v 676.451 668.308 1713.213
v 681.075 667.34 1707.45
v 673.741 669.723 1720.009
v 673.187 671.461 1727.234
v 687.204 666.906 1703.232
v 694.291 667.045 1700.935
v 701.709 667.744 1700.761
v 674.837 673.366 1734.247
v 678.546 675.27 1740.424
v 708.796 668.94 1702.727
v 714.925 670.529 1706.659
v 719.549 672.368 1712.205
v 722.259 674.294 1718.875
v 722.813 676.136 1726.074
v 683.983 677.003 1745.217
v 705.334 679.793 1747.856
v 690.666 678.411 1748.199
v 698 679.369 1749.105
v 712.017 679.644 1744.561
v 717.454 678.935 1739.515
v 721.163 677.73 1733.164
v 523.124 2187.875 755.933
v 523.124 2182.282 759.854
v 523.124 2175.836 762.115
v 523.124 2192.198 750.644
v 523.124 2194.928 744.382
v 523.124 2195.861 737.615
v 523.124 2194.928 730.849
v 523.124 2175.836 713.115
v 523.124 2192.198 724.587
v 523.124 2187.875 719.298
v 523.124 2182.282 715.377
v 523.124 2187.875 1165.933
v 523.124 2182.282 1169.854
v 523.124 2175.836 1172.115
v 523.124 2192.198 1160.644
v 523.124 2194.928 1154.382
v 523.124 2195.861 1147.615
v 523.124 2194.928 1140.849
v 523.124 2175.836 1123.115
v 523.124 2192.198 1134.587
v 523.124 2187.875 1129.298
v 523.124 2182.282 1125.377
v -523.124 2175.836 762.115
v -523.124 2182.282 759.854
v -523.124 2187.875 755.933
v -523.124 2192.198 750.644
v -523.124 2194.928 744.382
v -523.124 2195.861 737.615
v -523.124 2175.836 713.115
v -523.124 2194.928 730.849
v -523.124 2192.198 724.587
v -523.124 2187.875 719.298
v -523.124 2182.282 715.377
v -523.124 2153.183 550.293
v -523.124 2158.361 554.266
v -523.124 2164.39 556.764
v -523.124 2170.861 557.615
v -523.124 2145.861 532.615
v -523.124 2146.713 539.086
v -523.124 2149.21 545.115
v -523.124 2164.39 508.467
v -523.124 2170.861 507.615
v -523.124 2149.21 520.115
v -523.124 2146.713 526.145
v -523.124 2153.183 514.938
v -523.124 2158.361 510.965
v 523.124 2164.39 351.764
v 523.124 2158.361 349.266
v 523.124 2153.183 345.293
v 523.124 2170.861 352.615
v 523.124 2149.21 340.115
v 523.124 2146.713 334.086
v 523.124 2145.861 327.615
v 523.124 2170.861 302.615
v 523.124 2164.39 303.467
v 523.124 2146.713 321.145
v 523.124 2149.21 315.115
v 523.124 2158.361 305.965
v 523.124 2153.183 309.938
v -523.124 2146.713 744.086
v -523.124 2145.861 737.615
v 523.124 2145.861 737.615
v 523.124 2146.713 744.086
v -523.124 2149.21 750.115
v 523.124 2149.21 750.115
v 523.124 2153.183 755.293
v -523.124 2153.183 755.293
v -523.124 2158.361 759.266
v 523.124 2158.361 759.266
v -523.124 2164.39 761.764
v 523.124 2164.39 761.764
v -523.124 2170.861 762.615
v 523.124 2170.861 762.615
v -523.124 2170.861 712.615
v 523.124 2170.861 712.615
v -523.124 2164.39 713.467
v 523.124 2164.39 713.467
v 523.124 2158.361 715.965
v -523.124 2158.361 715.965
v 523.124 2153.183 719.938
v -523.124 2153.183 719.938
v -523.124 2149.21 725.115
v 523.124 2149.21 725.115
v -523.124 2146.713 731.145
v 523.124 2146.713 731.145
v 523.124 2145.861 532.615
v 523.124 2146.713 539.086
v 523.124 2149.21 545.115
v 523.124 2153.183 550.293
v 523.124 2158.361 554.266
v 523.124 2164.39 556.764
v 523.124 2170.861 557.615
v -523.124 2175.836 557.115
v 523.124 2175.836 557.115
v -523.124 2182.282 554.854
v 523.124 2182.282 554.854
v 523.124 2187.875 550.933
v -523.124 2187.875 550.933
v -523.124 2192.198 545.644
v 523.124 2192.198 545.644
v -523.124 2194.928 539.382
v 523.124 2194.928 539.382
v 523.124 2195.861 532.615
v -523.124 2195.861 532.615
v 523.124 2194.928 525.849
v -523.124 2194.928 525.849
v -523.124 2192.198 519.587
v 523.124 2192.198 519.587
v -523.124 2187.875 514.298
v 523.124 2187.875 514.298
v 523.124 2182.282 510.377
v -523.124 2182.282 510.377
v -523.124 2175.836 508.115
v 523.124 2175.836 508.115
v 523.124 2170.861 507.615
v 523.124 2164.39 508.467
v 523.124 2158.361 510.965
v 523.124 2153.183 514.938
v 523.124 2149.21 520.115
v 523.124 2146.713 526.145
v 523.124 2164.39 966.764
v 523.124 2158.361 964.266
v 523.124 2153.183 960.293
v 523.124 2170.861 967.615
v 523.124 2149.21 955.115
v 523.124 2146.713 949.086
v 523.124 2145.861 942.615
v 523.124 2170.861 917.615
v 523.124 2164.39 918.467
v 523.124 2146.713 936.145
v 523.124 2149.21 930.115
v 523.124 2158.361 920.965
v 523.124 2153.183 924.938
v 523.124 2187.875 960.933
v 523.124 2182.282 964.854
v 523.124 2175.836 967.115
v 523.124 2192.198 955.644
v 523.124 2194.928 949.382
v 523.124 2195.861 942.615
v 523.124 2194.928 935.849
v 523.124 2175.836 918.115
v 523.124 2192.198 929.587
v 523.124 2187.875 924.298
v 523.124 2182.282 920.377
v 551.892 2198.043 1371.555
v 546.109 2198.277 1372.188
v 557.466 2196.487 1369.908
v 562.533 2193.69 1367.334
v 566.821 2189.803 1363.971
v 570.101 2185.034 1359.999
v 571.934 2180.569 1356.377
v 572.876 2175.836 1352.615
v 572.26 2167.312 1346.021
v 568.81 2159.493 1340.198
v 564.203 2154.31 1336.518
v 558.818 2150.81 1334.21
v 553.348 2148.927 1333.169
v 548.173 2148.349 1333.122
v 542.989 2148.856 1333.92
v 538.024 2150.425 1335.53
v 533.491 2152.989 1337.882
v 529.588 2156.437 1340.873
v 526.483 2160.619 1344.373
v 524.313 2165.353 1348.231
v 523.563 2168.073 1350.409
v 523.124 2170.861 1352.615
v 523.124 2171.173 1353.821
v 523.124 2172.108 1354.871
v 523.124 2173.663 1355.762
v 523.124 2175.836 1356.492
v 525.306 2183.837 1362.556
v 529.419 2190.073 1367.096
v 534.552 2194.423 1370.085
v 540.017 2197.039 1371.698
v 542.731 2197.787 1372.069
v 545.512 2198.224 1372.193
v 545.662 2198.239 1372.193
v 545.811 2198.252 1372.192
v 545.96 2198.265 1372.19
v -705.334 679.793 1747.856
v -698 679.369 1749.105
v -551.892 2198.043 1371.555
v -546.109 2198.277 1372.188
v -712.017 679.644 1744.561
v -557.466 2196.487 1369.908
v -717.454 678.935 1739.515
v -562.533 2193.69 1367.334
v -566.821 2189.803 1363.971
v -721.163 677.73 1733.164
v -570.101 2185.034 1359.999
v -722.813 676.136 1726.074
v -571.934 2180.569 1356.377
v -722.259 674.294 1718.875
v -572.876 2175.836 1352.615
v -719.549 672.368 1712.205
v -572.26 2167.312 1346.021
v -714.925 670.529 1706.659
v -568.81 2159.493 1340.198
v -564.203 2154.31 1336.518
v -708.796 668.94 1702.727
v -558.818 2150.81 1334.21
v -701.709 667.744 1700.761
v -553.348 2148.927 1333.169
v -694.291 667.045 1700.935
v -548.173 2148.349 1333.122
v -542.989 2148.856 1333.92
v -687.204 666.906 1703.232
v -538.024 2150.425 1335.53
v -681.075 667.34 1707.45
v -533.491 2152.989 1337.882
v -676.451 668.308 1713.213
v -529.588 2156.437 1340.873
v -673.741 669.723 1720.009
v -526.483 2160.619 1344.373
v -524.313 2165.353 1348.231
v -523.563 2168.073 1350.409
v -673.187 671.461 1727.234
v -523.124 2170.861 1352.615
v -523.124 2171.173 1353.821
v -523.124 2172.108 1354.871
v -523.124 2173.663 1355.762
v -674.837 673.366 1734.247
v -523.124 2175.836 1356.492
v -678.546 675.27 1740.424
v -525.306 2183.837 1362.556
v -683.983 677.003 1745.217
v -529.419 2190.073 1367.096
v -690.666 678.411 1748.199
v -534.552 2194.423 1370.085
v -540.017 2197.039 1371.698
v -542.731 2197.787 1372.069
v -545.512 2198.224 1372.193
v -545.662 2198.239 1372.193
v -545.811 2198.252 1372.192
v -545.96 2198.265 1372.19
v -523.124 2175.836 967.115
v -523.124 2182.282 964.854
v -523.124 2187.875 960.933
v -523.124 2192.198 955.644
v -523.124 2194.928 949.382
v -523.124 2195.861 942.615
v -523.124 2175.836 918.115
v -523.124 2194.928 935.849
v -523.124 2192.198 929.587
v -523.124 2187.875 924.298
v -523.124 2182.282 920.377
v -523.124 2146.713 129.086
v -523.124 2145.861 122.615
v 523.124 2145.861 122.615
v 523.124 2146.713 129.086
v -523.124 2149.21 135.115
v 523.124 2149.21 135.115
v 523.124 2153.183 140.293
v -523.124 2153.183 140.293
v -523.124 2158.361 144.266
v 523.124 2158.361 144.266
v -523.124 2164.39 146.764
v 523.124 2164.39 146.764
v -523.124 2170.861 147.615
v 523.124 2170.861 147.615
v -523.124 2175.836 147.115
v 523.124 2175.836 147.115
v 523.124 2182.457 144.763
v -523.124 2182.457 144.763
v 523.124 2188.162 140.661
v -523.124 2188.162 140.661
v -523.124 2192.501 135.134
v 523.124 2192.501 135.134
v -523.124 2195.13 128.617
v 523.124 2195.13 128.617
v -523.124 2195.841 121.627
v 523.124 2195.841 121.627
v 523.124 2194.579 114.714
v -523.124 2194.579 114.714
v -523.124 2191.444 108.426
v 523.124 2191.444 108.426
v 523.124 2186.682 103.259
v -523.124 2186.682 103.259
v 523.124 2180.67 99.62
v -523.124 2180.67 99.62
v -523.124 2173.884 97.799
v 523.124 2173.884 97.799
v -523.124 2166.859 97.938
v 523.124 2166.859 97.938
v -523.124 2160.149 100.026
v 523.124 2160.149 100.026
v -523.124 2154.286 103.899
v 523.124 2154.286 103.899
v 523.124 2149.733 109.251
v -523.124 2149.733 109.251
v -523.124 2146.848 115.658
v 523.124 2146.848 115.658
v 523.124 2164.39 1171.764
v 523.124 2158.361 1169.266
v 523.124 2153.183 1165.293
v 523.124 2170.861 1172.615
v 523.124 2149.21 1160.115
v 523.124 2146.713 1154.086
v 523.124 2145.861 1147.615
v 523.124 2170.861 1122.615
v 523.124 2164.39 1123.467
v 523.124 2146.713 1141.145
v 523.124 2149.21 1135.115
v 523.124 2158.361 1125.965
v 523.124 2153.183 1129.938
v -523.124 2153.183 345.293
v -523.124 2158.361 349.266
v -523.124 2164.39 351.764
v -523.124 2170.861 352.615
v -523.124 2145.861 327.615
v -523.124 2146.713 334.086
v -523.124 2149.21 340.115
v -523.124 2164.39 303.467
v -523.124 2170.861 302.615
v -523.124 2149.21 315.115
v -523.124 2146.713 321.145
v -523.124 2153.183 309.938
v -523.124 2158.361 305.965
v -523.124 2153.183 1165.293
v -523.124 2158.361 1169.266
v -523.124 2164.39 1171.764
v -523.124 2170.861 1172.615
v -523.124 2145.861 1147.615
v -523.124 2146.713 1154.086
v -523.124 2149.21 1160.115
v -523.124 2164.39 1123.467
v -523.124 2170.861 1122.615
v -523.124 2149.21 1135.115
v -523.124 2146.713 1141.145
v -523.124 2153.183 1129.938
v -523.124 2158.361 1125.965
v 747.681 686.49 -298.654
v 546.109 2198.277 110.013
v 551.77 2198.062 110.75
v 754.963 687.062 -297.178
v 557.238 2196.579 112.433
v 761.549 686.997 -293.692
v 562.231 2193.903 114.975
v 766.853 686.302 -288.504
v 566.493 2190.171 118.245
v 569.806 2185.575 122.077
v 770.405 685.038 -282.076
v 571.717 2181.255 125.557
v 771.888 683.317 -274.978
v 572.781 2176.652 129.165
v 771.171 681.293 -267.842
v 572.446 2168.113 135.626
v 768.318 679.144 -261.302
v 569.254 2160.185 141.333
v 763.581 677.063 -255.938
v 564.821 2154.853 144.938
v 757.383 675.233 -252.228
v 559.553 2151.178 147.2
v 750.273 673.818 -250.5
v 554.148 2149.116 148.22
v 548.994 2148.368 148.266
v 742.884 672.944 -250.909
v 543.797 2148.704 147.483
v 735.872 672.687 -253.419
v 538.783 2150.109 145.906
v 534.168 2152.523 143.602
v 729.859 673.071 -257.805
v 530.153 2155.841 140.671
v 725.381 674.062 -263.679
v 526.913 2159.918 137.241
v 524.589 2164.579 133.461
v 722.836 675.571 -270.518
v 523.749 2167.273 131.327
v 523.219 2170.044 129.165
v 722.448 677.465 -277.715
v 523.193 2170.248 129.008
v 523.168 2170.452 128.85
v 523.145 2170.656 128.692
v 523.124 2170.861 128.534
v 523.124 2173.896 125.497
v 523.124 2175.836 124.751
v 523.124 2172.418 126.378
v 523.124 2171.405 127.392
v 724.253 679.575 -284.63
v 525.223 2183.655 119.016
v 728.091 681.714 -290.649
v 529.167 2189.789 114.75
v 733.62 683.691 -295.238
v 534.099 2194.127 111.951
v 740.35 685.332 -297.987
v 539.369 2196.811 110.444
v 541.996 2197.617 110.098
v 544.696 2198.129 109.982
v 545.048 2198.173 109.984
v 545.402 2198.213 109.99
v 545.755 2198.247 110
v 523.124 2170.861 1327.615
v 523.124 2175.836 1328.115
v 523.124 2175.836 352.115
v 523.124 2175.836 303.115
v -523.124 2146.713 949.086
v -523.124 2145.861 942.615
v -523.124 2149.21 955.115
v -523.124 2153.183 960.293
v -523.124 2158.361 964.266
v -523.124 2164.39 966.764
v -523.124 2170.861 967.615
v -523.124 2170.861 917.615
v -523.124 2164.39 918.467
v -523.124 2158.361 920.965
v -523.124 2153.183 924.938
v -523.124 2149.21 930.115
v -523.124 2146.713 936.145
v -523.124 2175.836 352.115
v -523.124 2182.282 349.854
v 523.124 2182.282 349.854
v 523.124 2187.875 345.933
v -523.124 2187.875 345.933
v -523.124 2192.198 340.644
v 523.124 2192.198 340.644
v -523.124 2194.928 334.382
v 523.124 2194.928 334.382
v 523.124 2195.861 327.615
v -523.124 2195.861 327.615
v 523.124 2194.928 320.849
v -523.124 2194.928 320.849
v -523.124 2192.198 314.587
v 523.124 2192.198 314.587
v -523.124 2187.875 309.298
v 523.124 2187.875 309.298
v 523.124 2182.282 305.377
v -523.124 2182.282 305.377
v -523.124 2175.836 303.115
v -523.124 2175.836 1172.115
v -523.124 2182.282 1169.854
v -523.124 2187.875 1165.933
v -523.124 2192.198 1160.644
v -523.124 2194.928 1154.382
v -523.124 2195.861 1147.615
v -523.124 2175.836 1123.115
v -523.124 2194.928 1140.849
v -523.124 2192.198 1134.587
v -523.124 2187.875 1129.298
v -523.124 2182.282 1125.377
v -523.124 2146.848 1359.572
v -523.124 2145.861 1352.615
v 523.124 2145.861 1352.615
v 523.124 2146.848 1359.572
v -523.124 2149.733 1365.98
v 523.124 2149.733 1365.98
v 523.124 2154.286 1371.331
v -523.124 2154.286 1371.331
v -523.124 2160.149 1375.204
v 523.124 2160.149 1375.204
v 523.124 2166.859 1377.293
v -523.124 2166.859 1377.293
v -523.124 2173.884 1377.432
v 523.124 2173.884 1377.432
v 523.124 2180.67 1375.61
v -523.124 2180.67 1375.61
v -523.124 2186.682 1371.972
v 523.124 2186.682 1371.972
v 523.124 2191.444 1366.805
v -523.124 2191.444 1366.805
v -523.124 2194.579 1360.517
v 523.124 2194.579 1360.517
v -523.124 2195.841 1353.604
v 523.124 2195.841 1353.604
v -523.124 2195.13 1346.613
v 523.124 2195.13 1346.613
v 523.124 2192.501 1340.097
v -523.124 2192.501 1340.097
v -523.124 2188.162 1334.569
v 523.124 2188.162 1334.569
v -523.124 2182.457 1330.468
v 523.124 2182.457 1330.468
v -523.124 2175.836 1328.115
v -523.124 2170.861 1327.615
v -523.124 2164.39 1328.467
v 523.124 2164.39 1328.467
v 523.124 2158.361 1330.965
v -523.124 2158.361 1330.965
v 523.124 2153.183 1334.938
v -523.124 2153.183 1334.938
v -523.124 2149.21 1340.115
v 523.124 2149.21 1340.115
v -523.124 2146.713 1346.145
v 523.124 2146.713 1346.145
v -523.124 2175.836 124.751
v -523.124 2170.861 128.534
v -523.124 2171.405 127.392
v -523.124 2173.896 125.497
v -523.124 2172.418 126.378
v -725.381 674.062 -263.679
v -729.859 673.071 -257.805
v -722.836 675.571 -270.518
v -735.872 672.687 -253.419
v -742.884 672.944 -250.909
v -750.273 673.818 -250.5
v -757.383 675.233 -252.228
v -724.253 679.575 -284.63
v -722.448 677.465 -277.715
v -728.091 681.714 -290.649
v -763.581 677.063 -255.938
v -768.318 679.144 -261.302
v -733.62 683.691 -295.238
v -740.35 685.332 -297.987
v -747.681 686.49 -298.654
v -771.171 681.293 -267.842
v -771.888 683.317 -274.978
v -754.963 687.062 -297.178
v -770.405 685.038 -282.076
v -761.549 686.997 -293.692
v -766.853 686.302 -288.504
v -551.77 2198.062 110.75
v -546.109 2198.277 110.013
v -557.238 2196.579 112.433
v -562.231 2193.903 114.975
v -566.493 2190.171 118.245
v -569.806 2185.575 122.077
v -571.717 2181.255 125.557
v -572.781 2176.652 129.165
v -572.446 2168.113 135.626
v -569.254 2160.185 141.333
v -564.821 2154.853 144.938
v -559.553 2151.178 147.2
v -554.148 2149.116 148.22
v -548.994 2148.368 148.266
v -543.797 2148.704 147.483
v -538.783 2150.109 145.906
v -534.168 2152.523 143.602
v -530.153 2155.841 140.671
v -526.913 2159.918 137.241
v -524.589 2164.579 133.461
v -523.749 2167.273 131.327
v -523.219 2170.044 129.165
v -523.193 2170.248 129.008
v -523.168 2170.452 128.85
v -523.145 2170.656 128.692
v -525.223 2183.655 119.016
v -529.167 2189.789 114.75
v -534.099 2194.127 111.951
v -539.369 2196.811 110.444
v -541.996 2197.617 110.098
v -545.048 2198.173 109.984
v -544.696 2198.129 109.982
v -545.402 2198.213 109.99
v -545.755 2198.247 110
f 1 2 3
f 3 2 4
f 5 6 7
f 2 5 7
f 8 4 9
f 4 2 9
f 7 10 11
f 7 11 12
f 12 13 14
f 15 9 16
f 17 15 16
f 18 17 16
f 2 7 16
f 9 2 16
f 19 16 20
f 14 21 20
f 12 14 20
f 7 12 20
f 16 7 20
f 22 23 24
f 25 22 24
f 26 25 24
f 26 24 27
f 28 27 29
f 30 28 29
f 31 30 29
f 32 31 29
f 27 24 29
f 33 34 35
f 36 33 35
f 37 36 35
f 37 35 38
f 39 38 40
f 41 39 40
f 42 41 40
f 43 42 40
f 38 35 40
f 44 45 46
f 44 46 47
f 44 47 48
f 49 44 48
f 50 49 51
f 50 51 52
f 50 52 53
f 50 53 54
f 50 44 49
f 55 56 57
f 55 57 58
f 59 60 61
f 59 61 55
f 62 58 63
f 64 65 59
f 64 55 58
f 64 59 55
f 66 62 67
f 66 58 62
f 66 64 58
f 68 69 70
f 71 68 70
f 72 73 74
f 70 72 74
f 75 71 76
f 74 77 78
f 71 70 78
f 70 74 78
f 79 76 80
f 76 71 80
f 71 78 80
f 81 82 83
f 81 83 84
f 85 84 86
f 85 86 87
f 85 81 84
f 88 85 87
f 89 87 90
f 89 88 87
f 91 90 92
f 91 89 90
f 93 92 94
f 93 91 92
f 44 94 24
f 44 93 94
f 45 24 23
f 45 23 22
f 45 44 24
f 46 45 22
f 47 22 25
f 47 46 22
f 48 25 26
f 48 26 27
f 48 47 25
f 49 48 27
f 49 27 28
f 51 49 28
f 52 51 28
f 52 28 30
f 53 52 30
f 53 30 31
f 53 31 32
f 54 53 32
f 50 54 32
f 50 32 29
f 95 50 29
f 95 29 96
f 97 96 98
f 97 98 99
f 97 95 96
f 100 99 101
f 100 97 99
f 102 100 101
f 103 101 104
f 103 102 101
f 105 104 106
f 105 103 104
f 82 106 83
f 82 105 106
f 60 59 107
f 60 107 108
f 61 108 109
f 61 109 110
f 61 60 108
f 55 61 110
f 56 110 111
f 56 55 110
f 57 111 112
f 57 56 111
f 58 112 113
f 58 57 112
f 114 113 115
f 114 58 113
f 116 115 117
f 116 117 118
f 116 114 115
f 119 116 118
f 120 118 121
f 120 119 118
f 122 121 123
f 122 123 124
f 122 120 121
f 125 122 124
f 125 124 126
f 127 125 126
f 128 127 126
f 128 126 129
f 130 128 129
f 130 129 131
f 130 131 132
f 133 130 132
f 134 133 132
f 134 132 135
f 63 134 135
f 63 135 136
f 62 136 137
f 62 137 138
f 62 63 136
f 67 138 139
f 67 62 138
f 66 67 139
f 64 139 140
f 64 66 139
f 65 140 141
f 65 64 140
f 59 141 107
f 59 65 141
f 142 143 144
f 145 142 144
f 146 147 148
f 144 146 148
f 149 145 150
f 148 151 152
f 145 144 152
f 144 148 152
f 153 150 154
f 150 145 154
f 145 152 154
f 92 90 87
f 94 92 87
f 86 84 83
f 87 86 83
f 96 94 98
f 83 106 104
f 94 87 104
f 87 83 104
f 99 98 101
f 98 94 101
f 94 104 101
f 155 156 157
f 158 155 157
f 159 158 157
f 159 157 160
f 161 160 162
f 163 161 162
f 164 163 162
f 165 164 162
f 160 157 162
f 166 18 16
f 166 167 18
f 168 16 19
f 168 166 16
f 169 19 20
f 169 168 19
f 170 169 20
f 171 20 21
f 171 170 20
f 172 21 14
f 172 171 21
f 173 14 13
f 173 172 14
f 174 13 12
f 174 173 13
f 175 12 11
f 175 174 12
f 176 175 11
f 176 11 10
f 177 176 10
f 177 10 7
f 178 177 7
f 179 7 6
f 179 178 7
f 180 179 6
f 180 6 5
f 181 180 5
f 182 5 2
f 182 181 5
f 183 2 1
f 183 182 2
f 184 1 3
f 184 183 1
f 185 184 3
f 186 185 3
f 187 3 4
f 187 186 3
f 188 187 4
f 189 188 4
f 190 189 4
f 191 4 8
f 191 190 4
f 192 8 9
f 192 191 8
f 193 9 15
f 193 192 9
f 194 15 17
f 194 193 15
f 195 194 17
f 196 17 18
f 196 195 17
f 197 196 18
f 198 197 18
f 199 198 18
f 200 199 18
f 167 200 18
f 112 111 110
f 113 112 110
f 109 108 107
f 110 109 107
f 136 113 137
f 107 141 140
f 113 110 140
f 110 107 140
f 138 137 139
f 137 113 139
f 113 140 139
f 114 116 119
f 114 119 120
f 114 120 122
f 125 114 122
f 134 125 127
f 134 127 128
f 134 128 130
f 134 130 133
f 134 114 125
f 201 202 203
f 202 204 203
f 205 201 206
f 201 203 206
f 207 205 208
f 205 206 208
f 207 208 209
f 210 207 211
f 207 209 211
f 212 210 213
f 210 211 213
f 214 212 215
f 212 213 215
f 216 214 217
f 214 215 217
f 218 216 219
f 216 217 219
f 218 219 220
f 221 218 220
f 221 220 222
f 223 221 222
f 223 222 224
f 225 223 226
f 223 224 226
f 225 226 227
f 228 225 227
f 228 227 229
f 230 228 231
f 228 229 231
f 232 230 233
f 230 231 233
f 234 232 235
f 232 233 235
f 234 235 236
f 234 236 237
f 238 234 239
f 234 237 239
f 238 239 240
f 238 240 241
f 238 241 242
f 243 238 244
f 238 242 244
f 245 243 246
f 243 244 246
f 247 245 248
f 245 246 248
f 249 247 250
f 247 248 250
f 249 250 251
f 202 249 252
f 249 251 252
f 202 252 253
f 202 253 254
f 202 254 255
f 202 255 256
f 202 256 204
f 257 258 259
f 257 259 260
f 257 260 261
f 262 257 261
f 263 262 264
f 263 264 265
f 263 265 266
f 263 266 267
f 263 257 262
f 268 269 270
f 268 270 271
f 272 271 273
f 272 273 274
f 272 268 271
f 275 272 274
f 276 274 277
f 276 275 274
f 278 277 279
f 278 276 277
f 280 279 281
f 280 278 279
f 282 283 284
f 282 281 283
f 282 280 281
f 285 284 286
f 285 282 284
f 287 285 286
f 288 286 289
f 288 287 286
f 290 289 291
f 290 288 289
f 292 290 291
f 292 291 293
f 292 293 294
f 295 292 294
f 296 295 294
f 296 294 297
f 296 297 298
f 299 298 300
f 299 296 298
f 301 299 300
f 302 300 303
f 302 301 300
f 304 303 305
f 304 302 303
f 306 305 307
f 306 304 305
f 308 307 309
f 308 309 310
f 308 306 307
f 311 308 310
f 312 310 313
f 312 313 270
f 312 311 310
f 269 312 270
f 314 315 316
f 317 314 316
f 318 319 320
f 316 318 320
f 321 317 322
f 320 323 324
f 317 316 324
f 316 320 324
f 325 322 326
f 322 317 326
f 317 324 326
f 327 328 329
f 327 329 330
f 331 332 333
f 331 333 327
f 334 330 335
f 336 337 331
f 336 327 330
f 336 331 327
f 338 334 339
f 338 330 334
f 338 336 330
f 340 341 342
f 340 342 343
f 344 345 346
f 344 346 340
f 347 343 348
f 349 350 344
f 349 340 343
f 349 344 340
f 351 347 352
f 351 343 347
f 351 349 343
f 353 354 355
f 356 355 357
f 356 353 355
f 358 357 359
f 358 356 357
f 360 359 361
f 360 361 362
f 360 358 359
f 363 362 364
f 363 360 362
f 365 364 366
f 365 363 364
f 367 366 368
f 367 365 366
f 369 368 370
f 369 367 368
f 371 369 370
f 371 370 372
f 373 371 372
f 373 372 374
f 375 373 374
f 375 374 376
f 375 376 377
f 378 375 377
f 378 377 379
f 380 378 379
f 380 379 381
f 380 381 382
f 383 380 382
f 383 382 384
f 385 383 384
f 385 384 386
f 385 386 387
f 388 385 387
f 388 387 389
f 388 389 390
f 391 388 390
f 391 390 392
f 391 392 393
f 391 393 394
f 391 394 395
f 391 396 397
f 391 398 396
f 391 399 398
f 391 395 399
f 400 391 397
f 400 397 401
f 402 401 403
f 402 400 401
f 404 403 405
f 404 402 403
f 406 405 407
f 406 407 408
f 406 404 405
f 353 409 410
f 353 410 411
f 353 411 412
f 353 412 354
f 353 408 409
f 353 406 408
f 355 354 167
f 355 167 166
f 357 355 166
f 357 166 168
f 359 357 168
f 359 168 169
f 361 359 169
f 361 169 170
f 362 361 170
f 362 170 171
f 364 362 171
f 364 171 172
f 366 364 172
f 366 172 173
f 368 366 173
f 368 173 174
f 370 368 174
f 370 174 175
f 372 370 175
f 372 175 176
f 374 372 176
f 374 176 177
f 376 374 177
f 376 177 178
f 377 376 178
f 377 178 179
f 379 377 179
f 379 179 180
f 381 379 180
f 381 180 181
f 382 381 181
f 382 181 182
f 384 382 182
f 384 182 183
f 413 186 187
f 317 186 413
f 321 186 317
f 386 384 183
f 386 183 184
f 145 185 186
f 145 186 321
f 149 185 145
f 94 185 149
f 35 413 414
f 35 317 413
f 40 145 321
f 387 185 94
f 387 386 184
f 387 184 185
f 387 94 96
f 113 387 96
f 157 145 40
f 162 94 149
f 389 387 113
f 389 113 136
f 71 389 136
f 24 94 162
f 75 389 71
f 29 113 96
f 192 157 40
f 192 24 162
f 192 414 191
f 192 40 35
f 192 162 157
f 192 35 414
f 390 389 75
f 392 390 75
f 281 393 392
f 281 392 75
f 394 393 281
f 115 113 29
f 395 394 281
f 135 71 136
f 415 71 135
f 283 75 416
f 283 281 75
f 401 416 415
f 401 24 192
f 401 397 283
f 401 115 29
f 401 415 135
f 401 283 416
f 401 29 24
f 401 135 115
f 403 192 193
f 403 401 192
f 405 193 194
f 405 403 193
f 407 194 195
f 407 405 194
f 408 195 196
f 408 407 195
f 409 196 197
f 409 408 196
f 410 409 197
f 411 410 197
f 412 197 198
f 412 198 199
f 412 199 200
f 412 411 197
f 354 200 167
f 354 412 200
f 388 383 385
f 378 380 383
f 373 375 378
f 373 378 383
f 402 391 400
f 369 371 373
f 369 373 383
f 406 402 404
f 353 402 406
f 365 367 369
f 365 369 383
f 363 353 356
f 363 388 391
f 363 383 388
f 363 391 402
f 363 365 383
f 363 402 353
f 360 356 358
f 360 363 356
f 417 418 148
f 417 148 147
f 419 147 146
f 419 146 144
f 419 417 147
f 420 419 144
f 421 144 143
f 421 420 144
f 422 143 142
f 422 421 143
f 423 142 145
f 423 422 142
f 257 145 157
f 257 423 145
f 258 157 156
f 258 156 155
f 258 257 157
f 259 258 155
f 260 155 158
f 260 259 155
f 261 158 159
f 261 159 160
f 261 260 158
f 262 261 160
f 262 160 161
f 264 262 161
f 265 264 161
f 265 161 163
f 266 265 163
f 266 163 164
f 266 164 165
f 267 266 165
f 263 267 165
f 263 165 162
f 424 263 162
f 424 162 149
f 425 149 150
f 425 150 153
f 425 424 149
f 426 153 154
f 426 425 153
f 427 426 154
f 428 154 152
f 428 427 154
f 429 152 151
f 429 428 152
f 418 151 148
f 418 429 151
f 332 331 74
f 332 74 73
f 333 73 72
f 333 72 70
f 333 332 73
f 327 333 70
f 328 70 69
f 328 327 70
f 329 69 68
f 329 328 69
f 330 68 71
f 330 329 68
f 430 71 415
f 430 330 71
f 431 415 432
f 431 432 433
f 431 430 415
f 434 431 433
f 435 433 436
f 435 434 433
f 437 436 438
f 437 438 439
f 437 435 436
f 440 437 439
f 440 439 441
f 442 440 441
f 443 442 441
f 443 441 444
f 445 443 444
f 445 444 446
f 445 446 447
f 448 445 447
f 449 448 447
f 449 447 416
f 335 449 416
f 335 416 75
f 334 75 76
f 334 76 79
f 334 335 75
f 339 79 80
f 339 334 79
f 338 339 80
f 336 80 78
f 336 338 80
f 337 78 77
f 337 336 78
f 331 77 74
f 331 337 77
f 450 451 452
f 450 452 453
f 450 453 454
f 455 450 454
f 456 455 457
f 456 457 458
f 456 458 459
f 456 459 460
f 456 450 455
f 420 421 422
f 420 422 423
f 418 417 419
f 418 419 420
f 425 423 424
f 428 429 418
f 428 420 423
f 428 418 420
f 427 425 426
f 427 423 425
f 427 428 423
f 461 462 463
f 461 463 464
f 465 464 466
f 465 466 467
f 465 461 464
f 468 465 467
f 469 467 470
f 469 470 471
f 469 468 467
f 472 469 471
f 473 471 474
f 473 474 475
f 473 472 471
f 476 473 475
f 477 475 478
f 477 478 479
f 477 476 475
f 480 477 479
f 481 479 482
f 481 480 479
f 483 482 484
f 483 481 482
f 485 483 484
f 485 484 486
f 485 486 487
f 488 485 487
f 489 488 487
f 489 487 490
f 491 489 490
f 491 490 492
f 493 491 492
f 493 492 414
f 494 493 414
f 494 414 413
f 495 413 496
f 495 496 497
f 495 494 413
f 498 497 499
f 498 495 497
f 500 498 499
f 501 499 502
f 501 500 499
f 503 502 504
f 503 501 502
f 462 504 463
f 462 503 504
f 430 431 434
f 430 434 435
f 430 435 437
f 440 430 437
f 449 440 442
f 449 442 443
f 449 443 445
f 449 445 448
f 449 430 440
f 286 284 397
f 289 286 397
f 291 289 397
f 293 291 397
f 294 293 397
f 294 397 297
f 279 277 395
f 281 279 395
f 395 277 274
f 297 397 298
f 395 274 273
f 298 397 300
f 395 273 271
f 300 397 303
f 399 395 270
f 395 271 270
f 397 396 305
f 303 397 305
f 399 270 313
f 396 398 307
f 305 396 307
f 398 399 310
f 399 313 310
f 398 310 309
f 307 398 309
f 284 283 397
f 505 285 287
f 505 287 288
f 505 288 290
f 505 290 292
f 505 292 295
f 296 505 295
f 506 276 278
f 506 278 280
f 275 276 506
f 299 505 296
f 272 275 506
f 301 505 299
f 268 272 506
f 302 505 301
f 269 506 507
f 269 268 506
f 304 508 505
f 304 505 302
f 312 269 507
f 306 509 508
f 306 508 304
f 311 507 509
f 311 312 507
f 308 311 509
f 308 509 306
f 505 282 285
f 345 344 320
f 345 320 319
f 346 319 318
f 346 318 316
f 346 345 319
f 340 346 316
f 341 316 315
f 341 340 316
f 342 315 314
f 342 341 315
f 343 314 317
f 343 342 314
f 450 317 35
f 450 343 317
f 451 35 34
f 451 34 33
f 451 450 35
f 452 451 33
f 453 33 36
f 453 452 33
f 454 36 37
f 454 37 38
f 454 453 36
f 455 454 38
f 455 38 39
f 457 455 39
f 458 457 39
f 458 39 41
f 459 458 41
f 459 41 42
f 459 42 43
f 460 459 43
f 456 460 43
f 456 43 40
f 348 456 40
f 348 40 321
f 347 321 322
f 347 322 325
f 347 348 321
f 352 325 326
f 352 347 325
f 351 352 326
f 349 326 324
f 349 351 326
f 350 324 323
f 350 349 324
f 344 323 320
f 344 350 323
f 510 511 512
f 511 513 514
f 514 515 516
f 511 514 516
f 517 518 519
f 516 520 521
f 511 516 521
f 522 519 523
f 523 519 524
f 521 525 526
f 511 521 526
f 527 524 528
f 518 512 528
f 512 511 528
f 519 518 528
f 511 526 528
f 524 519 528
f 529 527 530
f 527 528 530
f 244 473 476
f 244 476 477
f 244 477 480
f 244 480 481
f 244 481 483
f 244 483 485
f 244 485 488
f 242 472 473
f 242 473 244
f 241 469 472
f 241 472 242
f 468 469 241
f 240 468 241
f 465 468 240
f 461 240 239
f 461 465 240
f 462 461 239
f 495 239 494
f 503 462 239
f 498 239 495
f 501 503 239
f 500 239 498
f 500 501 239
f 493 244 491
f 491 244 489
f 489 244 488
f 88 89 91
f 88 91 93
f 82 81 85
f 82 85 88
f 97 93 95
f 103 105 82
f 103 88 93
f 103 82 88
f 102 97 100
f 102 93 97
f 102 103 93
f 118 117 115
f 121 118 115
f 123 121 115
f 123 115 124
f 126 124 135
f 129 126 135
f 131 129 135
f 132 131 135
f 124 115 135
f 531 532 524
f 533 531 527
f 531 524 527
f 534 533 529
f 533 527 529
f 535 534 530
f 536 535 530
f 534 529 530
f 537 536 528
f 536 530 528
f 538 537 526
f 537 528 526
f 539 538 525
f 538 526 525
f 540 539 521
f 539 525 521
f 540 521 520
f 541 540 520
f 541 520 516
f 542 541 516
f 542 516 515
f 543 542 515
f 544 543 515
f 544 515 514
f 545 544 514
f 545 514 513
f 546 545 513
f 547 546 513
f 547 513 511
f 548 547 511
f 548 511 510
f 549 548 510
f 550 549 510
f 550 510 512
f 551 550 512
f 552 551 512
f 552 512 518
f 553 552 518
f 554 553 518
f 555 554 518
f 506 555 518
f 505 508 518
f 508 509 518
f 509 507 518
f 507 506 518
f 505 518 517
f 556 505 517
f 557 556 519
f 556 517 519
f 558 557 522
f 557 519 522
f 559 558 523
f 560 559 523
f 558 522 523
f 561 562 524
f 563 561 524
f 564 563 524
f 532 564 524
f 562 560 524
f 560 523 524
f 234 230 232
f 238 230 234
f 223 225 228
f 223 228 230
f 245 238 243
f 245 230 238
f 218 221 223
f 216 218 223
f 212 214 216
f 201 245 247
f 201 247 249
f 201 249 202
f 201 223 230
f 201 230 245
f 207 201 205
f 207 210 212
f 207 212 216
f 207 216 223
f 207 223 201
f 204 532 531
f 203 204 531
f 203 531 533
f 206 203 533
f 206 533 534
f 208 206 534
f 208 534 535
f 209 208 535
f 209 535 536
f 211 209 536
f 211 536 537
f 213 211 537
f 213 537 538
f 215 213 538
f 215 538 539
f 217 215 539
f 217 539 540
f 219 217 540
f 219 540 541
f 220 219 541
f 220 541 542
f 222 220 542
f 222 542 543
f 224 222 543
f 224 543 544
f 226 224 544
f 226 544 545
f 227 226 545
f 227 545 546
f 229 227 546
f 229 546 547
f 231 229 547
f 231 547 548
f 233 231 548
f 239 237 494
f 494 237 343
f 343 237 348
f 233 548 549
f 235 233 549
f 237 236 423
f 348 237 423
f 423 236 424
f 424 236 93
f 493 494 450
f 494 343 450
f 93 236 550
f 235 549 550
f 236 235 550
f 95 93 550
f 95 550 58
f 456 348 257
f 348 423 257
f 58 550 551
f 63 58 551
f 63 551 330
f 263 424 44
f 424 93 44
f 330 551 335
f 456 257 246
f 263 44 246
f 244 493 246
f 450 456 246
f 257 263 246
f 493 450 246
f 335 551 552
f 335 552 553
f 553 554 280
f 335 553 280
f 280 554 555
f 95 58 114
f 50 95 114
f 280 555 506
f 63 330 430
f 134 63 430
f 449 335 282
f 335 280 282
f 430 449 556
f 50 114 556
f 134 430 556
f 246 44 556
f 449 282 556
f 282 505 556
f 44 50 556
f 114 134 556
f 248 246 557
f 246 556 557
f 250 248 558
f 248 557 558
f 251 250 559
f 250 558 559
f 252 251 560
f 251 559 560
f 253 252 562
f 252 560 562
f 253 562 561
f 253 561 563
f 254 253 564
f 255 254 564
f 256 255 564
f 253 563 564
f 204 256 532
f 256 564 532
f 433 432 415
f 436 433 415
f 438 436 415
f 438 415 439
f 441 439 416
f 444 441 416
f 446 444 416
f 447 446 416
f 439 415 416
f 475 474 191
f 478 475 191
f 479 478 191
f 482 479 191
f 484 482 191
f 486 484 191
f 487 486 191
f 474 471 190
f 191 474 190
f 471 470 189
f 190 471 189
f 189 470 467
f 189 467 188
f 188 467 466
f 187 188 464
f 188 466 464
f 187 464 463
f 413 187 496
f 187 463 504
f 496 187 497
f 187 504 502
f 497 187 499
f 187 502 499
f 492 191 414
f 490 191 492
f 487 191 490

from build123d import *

# Parameters (mm, degrees)
SWEEP1_PROFILE_R = 25
SWEEP4_PROFILE_R = 25
LPATTERN1_COUNT  = 7
LPATTERN1_PITCH  = 205


with BuildPart() as part:
    # Sweep1: sweep along a curve in space
    with BuildLine() as sweep1_path:
        Line((698, 673.348237879, 1724.841016462), (548, 2173.348237879, 1352.615298417))
        Line((548, 2173.348237879, 1352.615298417), (548, 2173.348237879, 129.165241299))
        Line((548, 2173.348237879, 129.165241299), (747.126637555, 679.898456219, -274.544806265))
    # Sweep1 profile (on start of the path) → Sweep1 (sweep)
    with BuildSketch(Plane(origin=(698, 673.348237879, 1724.841016462), x_dir=(0, 0.24084577238006388, 0.9705634002612351), z_dir=(-0.09660241237961904, 0.9660241237961907, -0.23971934875232764))):
        Circle(SWEEP1_PROFILE_R)
    sweep(path=sweep1_path.line, transition=Transition.RIGHT)


with BuildPart() as body_2:
    # Mirror2: mirrored copy
    add(part.part.mirror(Plane(origin=(0, 0, 0), x_dir=(0, 0, 1), z_dir=(1, 0, 0))))


with BuildPart() as part_1:
    add(part.part)

    add(body_2.part)  # Sweep4 merges body 2
    # Sweep4: sweep along a curve in space
    with BuildLine() as sweep4_path:
        Line((523.124060053, 2170.860746823, 1352.61537863), (-523.124060053, 2170.860746823, 1352.61537863))
    # Sweep4 profile (on start of the path) → Sweep4 (sweep)
    with BuildSketch(Plane(origin=(523.124060053, 2170.860746823, 1352.61537863), x_dir=(0, -1, 0), z_dir=(-1, 0, 0))):
        Circle(SWEEP4_PROFILE_R)
    sweep4 = sweep(path=sweep4_path.line)

    # LPattern1: Sweep4 ×7
    with Locations(*[(0, 0, -i * LPATTERN1_PITCH) for i in range(1, LPATTERN1_COUNT)]):
        add(sweep4)


solid = part_1.part
